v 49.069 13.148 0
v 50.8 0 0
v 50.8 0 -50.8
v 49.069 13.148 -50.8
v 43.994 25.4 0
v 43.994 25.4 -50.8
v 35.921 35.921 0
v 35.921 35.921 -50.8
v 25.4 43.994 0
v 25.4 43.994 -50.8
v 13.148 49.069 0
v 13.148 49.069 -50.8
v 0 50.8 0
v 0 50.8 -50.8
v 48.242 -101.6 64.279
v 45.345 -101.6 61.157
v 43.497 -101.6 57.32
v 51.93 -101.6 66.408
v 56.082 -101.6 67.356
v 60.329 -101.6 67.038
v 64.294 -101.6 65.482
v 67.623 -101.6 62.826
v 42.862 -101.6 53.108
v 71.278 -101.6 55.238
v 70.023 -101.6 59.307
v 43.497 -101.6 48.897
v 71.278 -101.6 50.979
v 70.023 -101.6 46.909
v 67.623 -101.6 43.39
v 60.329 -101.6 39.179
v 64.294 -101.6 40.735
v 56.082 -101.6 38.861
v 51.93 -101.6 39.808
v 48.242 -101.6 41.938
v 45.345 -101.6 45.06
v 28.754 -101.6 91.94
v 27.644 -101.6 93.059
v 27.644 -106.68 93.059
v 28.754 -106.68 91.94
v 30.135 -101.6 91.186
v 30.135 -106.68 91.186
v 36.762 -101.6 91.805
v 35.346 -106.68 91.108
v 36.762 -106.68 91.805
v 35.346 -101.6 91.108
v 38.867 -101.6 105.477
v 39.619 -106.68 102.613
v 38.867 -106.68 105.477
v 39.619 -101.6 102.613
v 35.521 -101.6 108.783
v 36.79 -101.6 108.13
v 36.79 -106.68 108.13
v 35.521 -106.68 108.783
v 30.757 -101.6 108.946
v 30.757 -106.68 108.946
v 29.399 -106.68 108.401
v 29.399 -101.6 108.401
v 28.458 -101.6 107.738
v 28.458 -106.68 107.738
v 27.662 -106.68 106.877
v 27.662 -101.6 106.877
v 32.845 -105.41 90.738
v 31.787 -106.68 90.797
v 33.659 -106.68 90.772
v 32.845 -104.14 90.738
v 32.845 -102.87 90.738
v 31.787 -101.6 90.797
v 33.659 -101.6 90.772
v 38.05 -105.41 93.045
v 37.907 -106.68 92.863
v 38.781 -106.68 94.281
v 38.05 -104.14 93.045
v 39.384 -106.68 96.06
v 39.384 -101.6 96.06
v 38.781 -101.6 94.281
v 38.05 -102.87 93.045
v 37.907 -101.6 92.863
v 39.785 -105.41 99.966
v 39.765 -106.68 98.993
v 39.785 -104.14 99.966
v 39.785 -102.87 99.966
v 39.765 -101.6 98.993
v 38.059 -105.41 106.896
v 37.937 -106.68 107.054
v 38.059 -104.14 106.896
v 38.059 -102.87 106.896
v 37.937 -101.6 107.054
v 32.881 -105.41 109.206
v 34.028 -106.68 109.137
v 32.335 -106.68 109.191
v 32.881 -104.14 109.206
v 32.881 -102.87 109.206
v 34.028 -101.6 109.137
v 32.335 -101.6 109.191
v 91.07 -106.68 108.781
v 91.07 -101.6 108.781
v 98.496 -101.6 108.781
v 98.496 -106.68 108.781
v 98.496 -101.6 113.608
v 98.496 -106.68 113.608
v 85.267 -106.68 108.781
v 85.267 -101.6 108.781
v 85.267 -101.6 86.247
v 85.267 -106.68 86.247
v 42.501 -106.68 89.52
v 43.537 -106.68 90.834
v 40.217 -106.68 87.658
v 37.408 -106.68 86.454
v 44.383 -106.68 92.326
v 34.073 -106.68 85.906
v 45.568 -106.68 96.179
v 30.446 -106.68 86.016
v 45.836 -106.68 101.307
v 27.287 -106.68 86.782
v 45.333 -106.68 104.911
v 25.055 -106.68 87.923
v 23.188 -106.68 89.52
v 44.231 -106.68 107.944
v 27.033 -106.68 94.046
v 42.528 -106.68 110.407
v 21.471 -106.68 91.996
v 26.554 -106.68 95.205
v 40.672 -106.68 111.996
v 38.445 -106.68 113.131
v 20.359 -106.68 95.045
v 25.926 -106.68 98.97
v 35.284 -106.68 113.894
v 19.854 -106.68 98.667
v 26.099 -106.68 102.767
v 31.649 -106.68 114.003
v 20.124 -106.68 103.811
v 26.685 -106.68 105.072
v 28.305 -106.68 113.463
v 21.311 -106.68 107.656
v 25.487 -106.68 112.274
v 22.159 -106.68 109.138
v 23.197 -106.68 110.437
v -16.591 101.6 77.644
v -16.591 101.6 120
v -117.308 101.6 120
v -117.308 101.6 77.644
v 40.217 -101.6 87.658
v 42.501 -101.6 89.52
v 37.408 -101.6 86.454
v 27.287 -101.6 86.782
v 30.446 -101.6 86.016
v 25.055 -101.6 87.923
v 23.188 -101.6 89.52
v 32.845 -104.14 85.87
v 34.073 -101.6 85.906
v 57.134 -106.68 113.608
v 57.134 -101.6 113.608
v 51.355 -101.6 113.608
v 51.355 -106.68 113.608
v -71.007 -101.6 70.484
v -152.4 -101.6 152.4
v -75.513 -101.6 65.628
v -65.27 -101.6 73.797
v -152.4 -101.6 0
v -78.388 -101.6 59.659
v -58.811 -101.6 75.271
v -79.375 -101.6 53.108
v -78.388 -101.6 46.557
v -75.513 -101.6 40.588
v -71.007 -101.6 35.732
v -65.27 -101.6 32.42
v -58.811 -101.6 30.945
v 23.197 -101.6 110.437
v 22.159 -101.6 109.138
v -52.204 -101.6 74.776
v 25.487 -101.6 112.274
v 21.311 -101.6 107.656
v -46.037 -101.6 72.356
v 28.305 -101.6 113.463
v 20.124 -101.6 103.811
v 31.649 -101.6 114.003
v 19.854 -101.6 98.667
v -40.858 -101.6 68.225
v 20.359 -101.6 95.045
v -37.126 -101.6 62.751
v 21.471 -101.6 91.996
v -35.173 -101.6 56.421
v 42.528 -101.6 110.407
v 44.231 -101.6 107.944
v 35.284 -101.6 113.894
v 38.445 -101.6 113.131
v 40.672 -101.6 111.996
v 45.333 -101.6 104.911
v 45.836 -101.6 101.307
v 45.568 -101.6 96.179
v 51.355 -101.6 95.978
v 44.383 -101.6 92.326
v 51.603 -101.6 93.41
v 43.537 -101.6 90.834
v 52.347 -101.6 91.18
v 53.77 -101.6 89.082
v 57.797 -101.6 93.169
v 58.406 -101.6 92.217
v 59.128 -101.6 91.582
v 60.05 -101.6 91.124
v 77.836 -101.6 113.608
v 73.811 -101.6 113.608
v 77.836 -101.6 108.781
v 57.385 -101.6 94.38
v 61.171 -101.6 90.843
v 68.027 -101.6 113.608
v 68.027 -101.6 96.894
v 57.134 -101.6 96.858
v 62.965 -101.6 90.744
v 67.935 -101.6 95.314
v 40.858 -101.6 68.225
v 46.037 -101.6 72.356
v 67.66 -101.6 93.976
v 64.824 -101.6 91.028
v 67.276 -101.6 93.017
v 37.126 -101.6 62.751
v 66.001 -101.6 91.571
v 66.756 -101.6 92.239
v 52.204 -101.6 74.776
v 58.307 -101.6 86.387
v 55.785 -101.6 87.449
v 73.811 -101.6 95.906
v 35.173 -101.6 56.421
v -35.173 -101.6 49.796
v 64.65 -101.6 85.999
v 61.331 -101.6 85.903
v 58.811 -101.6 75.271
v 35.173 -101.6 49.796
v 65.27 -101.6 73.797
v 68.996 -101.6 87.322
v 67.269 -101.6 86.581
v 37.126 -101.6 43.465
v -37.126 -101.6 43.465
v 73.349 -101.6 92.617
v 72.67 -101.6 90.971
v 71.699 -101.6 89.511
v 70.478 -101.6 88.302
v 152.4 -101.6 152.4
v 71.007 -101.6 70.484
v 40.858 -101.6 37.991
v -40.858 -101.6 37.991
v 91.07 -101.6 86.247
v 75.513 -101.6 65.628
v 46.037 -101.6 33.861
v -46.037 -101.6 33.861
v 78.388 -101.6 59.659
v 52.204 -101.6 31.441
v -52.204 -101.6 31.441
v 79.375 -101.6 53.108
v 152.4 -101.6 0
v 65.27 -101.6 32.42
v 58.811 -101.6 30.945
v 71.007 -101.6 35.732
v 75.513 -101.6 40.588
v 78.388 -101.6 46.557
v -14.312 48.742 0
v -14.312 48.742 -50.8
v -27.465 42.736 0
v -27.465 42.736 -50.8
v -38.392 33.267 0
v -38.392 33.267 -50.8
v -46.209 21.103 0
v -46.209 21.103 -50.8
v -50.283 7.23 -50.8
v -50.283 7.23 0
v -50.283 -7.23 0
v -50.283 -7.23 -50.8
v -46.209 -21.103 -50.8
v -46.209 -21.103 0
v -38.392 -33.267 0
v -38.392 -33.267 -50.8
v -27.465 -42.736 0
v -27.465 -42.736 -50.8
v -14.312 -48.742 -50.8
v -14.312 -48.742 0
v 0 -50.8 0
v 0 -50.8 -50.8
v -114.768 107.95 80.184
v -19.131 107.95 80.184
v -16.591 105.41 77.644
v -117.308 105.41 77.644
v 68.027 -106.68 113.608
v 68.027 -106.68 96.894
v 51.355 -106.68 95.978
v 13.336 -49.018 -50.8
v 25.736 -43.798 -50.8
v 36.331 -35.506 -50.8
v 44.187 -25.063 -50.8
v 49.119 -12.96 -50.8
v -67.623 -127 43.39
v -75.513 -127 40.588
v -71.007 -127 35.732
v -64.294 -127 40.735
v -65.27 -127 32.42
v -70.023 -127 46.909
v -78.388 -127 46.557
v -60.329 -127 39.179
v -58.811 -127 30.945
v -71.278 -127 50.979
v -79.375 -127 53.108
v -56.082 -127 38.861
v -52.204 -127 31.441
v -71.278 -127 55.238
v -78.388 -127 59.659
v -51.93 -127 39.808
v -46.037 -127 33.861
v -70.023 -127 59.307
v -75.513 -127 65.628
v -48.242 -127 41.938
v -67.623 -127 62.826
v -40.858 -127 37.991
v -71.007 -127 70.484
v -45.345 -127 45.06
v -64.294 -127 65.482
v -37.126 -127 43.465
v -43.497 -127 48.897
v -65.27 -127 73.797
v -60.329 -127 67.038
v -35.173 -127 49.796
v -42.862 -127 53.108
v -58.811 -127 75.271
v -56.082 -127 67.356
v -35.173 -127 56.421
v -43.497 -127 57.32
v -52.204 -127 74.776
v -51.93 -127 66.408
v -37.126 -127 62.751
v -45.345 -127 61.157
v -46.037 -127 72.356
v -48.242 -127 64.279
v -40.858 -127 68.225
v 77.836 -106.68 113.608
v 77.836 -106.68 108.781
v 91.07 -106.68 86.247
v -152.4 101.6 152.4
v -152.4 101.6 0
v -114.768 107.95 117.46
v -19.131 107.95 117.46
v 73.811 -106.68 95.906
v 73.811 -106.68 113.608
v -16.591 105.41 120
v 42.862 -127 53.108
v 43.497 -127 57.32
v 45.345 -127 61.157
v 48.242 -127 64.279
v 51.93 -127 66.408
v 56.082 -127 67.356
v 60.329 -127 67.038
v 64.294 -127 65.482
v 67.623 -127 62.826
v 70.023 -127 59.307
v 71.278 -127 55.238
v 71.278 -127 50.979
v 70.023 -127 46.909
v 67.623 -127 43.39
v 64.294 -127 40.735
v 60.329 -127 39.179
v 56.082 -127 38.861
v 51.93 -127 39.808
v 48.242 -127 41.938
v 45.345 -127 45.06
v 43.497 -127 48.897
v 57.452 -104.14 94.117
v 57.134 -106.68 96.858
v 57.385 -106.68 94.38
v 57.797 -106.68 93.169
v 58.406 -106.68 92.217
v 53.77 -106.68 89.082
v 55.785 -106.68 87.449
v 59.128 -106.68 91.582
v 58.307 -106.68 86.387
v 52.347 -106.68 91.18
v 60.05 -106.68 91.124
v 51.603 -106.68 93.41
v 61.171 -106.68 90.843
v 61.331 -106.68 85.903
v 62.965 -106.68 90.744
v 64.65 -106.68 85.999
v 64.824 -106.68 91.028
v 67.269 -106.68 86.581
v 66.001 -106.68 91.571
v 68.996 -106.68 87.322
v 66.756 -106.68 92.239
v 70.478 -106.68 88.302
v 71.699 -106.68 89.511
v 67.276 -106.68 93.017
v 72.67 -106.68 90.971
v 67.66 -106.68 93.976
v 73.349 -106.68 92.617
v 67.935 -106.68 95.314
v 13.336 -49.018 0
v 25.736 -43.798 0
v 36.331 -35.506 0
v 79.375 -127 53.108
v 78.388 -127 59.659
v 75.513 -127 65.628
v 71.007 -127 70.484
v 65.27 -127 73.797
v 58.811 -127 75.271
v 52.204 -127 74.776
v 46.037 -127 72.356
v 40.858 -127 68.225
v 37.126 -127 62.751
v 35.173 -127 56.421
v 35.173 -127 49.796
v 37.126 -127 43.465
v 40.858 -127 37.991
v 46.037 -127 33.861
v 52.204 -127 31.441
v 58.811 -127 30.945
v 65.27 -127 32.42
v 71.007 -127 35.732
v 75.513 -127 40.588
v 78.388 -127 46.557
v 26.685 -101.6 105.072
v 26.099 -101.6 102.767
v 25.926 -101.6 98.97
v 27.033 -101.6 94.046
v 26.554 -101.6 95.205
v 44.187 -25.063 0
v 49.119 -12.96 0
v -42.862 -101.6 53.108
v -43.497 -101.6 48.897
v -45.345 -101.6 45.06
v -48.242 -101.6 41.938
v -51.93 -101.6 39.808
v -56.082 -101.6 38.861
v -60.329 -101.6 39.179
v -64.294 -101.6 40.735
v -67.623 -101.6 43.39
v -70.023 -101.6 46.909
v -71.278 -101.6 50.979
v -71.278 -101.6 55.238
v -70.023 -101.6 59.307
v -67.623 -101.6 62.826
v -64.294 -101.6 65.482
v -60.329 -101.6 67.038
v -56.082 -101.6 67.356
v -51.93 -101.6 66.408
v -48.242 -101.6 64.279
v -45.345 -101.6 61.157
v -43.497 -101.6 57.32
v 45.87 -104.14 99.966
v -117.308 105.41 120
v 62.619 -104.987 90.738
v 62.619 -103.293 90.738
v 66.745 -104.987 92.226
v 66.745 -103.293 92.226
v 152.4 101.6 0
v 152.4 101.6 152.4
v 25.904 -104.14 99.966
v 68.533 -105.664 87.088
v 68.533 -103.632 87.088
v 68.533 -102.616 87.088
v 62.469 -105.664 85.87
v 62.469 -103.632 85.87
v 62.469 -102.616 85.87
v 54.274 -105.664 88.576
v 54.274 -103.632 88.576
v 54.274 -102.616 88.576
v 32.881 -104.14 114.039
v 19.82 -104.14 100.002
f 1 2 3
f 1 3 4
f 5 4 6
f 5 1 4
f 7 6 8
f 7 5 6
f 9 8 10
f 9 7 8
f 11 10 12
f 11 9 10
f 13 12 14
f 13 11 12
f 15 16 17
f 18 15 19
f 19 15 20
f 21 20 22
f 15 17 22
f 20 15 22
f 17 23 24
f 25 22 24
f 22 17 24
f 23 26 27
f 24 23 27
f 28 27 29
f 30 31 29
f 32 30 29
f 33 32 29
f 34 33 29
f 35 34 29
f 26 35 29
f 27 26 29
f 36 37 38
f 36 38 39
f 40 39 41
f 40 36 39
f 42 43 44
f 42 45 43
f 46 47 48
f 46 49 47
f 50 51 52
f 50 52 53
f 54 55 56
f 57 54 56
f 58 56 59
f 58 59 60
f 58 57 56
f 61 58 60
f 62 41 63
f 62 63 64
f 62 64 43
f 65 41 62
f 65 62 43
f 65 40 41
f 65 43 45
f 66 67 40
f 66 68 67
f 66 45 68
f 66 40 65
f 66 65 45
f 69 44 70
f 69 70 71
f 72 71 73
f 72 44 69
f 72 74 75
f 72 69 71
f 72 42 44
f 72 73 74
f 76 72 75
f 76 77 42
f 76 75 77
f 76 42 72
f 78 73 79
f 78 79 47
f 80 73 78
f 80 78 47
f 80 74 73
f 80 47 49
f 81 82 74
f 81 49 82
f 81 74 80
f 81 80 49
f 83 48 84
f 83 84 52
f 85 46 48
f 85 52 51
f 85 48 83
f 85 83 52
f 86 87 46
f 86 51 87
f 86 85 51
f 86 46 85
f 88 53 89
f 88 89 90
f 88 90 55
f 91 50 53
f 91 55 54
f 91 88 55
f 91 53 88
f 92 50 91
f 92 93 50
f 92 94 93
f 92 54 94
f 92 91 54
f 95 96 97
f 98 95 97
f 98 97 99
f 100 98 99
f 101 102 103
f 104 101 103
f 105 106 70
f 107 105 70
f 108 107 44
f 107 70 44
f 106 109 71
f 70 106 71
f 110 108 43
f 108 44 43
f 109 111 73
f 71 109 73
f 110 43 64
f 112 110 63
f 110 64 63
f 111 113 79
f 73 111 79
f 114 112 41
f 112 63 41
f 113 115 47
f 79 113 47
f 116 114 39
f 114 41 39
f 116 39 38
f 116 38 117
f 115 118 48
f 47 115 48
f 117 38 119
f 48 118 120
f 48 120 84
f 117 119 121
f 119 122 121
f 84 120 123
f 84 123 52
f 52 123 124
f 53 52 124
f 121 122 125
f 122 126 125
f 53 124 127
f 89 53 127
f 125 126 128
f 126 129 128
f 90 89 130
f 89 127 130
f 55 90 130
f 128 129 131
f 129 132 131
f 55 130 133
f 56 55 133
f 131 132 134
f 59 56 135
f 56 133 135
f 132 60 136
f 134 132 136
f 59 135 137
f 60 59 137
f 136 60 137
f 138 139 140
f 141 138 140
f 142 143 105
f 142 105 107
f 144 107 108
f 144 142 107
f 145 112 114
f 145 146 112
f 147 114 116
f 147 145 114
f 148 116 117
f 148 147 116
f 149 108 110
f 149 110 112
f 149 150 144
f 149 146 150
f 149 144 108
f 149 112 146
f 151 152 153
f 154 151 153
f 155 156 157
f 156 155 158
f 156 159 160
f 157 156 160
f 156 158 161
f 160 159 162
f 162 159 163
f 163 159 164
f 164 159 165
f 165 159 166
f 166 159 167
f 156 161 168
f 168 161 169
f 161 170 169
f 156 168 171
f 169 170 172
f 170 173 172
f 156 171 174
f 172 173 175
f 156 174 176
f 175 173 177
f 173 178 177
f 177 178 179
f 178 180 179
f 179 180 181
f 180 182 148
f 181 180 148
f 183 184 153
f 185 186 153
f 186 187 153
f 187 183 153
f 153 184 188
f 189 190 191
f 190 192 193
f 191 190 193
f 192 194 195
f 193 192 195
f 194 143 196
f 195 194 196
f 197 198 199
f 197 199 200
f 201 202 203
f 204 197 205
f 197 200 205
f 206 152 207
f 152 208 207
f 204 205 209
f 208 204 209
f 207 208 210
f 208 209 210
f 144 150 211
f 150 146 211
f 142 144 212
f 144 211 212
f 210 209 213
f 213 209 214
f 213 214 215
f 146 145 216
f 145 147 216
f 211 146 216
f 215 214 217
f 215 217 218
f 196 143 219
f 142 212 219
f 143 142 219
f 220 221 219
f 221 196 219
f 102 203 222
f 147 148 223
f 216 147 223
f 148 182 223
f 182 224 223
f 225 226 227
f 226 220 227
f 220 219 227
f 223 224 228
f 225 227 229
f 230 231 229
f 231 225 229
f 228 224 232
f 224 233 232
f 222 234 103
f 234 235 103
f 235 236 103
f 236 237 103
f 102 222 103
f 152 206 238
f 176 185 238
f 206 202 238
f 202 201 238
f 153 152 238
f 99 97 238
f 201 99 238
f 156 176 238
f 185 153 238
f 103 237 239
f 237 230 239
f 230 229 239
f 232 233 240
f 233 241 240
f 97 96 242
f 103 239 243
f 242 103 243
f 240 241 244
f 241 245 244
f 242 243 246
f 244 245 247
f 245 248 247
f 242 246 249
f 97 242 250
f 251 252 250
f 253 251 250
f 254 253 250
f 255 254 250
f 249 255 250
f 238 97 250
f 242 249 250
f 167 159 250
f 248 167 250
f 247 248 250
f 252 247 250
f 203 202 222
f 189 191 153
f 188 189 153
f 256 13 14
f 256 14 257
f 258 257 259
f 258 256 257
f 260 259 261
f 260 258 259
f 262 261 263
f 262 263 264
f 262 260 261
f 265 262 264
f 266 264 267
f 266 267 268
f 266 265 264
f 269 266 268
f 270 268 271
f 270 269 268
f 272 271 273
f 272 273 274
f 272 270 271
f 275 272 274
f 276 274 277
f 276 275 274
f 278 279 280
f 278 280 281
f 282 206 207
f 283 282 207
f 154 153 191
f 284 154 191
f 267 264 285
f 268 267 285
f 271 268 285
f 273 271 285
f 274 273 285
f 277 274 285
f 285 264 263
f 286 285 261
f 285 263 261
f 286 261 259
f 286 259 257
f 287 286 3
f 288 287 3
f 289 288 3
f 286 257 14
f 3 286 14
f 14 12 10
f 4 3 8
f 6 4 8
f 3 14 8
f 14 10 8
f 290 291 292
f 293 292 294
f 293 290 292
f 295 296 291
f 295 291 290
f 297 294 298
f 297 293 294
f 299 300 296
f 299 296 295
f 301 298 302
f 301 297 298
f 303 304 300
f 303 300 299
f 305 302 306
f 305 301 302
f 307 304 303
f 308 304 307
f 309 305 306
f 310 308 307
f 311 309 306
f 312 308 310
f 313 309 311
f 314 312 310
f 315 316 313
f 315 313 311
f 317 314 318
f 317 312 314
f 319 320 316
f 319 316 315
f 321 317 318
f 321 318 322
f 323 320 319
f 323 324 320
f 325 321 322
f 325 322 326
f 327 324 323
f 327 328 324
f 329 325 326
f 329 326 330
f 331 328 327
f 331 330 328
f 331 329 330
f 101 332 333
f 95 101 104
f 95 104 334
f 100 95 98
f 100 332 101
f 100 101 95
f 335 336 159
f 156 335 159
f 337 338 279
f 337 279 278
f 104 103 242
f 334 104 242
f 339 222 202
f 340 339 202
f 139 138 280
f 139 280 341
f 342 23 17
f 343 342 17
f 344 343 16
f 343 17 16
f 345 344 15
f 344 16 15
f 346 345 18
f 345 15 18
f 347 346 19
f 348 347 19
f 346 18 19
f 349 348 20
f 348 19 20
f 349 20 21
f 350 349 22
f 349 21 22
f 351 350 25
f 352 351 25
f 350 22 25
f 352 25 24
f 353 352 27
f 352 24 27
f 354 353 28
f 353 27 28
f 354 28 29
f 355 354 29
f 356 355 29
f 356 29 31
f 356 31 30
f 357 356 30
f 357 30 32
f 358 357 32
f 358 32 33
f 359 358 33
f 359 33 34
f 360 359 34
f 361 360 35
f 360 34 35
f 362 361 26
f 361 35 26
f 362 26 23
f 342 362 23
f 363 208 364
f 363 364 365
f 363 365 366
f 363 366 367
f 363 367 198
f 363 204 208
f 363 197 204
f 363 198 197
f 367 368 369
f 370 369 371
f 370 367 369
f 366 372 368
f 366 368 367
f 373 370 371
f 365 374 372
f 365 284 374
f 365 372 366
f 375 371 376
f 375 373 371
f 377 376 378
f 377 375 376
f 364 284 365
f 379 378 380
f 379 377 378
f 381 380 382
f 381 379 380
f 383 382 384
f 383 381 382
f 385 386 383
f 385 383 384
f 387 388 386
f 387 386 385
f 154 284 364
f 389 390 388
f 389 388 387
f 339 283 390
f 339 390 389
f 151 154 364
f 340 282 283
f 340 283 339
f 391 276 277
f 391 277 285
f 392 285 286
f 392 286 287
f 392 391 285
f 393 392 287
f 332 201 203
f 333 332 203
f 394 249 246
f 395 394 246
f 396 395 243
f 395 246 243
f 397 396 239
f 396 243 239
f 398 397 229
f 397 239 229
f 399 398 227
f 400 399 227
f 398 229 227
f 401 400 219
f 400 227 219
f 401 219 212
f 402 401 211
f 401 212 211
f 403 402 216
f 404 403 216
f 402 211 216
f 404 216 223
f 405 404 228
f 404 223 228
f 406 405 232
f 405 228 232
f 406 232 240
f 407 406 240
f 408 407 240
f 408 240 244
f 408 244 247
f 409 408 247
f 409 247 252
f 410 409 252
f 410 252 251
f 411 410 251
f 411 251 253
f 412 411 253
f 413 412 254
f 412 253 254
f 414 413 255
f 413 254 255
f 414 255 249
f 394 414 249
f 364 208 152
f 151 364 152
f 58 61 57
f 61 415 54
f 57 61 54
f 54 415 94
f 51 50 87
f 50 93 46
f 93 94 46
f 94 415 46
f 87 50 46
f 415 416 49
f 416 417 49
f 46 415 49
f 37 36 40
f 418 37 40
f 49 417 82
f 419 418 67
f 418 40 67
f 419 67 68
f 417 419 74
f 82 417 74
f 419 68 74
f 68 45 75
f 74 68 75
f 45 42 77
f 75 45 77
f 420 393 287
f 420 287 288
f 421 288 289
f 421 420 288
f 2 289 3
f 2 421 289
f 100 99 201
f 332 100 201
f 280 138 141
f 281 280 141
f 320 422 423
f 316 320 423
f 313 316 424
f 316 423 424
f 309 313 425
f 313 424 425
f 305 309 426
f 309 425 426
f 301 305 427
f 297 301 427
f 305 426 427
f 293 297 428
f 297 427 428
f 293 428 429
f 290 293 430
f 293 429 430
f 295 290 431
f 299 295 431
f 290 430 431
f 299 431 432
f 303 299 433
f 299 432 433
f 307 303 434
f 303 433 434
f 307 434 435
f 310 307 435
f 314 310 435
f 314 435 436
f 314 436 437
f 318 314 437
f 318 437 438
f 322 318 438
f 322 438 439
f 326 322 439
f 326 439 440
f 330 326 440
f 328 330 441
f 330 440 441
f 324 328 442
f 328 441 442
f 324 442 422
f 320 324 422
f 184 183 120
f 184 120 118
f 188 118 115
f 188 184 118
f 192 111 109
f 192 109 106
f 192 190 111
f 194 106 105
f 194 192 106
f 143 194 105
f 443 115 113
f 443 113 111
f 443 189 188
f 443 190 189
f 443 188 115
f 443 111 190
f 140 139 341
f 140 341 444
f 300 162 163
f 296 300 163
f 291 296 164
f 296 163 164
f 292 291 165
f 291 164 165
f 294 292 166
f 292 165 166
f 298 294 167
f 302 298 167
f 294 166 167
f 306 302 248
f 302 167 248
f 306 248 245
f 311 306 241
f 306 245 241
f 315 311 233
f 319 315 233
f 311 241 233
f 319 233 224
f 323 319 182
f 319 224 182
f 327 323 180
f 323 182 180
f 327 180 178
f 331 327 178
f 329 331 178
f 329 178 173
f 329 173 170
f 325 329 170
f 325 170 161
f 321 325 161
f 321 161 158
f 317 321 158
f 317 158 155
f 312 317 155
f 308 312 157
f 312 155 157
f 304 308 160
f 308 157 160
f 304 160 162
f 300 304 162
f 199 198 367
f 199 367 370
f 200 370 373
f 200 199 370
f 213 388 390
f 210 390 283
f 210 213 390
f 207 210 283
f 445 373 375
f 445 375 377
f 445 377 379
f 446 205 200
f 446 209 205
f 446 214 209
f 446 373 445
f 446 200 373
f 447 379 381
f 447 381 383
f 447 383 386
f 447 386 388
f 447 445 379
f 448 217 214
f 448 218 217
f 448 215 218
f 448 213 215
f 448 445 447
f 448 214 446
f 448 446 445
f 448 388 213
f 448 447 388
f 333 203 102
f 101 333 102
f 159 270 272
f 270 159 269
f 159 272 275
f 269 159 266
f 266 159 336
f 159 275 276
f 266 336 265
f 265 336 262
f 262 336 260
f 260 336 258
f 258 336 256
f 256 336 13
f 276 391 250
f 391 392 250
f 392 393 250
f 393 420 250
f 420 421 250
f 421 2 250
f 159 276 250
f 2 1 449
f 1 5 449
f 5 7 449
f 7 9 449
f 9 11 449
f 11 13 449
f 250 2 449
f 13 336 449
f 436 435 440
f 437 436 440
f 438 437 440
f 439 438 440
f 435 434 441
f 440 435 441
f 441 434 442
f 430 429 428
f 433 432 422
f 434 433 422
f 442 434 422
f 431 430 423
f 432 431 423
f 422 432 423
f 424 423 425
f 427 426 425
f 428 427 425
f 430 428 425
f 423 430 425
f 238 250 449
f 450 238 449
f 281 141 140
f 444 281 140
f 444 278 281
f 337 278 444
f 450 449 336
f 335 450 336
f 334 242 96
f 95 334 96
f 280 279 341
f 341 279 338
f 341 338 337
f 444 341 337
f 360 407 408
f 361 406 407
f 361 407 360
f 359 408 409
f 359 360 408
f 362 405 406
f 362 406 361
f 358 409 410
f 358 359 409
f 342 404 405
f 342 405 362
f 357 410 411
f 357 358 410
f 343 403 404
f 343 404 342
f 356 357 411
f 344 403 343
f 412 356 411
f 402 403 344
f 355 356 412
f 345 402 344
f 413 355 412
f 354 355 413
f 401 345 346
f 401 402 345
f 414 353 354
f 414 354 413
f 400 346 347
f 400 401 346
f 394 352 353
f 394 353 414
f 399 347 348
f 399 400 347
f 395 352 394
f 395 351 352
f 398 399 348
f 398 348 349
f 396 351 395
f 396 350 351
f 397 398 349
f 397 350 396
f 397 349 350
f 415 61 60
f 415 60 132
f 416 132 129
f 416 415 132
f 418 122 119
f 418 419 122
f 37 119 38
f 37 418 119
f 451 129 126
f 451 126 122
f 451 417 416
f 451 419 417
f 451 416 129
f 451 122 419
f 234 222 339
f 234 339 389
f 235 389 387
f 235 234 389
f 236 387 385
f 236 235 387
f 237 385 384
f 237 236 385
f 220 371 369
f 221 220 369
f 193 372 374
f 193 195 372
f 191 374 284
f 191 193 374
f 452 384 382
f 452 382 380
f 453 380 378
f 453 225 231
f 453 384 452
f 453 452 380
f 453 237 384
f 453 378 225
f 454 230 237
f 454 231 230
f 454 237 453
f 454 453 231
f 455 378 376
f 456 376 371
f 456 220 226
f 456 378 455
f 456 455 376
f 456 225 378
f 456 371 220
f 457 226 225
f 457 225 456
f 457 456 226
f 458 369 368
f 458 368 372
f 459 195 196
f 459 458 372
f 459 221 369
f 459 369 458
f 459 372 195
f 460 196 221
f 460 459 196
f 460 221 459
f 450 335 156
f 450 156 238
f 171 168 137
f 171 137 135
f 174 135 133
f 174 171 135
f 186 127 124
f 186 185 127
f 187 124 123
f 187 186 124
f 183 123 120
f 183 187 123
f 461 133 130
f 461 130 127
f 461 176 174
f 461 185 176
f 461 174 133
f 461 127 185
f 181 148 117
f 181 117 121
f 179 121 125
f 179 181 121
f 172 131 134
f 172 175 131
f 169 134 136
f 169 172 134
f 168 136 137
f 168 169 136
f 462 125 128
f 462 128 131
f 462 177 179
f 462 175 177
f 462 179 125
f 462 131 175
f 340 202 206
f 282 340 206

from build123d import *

# Parameters (mm, degrees)
F1_DEPTH  = 152.4
F2_DEPTH  = 50.8
F4_DEPTH  = 25.4
F5_W      = 100.7168591022
F5_H      = 42.3558056355
F6_DEPTH  = 6.35
F7_SIZE   = 2.54
F10_DEPTH = 5.08


with BuildPart() as f1:
    # F0 (on Top) → F1 (new body)
    with BuildSketch(Plane.XY):
        with BuildLine():
            Line((152.4, 0), (50.8, 0))
            ThreePointArc((50.8, 0), (47.0438920676, -19.1706082098), (36.3310149947, -35.5063001375))
            ThreePointArc((36.3310149947, -35.5063001375), (19.7093880297, -46.820722159), (0, -50.8))
            Line((0, -50.8), (0, -101.6))
            Line((0, -101.6), (152.4, -101.6))
            Line((152.4, -101.6), (152.4, 0))
        make_face()
        with BuildLine():
            ThreePointArc((0, 50.8), (35.9210244843, 35.9210244843), (50.8, 0))
            Line((50.8, 0), (152.4, 0))
            Line((152.4, 0), (152.4, 101.6))
            Line((152.4, 101.6), (0, 101.6))
            Line((0, 101.6), (0, 50.8))
        make_face()
        with BuildLine():
            ThreePointArc((0, -50.8), (-50.8, 0), (0, 50.8))
            Line((0, 50.8), (0, 101.6))
            Line((0, 101.6), (-152.4, 101.6))
            Line((-152.4, 101.6), (-152.4, -101.6))
            Line((-152.4, -101.6), (0, -101.6))
            Line((0, -101.6), (0, -50.8))
        make_face()
        with BuildLine():
            Line((0, -50.8), (0, 0))
            Line((0, 0), (0, 50.8))
            ThreePointArc((0, 50.8), (-50.8, 0), (0, -50.8))
        make_face()
        with BuildLine():
            Line((0, 50.8), (0, 0))
            Line((0, 0), (50.8, 0))
            ThreePointArc((50.8, 0), (35.9210244843, 35.9210244843), (0, 50.8))
        make_face()
        with BuildLine():
            Line((36.3310149947, -35.5063001375), (0, 0))
            Line((0, 0), (0, -50.8))
            ThreePointArc((0, -50.8), (19.7093880297, -46.820722159), (36.3310149947, -35.5063001375))
        make_face()
        with BuildLine():
            Line((50.8, 0), (0, 0))
            Line((0, 0), (36.3310149947, -35.5063001375))
            ThreePointArc((36.3310149947, -35.5063001375), (47.0438920676, -19.1706082098), (50.8, 0))
        make_face()
    extrude(amount=F1_DEPTH)

    # F0 (on Top) → F2 (join)
    with BuildSketch(Plane.XY):
        with BuildLine():
            Line((36.3310149947, -35.5063001375), (0, 0))
            Line((0, 0), (0, -50.8))
            ThreePointArc((0, -50.8), (19.7093880297, -46.820722159), (36.3310149947, -35.5063001375))
        make_face()
        with BuildLine():
            Line((50.8, 0), (0, 0))
            Line((0, 0), (36.3310149947, -35.5063001375))
            ThreePointArc((36.3310149947, -35.5063001375), (47.0438920676, -19.1706082098), (50.8, 0))
        make_face()
        with BuildLine():
            Line((0, 50.8), (0, 0))
            Line((0, 0), (50.8, 0))
            ThreePointArc((50.8, 0), (35.9210244843, 35.9210244843), (0, 50.8))
        make_face()
        with BuildLine():
            Line((0, -50.8), (0, 0))
            Line((0, 0), (0, 50.8))
            ThreePointArc((0, 50.8), (-50.8, 0), (0, -50.8))
        make_face()
    extrude(amount=-F2_DEPTH)

    # F3 (on face) → F4 (join)
    with BuildSketch(Plane.XZ.offset(101.6)):
        with BuildLine():
            ThreePointArc((34.925, 53.1082823873), (57.15, 30.8832823873), (79.375, 53.1082823873))
            Line((79.375, 53.1082823873), (71.4375, 53.1082823873))
            ThreePointArc((71.4375, 53.1082823873), (57.15, 38.8207823873), (42.8625, 53.1082823873))
            Line((42.8625, 53.1082823873), (34.925, 53.1082823873))
        make_face()
        with BuildLine():
            Line((71.4375, 53.1082823873), (79.375, 53.1082823873))
            ThreePointArc((79.375, 53.1082823873), (57.15, 75.3332823873), (34.925, 53.1082823873))
            Line((34.925, 53.1082823873), (42.8625, 53.1082823873))
            ThreePointArc((42.8625, 53.1082823873), (57.15, 67.3957823873), (71.4375, 53.1082823873))
        make_face()
        with BuildLine():
            ThreePointArc((-34.925, 53.1082823873), (-57.15, 75.3332823873), (-79.375, 53.1082823873))
            Line((-79.375, 53.1082823873), (-71.4375, 53.1082823873))
            ThreePointArc((-71.4375, 53.1082823873), (-57.15, 67.3957823873), (-42.8625, 53.1082823873))
            Line((-42.8625, 53.1082823873), (-34.925, 53.1082823873))
        make_face()
        with BuildLine():
            Line((-71.4375, 53.1082823873), (-79.375, 53.1082823873))
            ThreePointArc((-79.375, 53.1082823873), (-57.15, 30.8832823873), (-34.925, 53.1082823873))
            Line((-34.925, 53.1082823873), (-42.8625, 53.1082823873))
            ThreePointArc((-42.8625, 53.1082823873), (-57.15, 38.8207823873), (-71.4375, 53.1082823873))
        make_face()
    extrude(amount=F4_DEPTH)

    # F9 (on face) + F8 (on face) → F10 (join)
    with BuildSketch(Plane.XZ.offset(101.6)):
        Polygon((91.0699902064, 86.2468481064), (91.0699902064, 108.7812007722), (98.4956073484, 108.7812007722), (98.4956073484, 113.6078519145), (77.8356241709, 113.6078519145), (77.8356241709, 108.7812007722), (85.2672297139, 108.7812007722), (85.2672297139, 86.2468481064), align=None)
        with BuildLine():
            Line((73.811418752, 113.6078519145), (68.0266234623, 113.6078519145))
            Line((68.0266234623, 113.6078519145), (68.0266234623, 96.894224944))
            add(Edge.make_bspline(
                [(66.7451056652, 92.226266426), (68.0266234623, 93.7143840549), (68.0266234623, 96.894224944)],
                knots=[0, 0, 0, 1, 1, 1], degree=2))
            add(Edge.make_bspline(
                [(62.6190974306, 90.7381487971), (65.4635878681, 90.7381487971), (66.7451056652, 92.226266426)],
                knots=[0, 0, 0, 1, 1, 1], degree=2))
            add(Edge.make_bspline(
                [(58.4062573827, 92.2172838246), (59.6787925784, 90.7381487971), (62.6190974306, 90.7381487971)],
                knots=[0, 0, 0, 1, 1, 1], degree=2))
            add(Edge.make_bspline(
                [(57.1337221869, 96.8582945384), (57.1337221869, 93.6964188521), (58.4062573827, 92.2172838246)],
                knots=[0, 0, 0, 1, 1, 1], degree=2))
            Line((57.1337221869, 96.8582945384), (57.1337221869, 113.6078519145))
            Line((57.1337221869, 113.6078519145), (51.3549152982, 113.6078519145))
            Line((51.3549152982, 113.6078519145), (51.3549152982, 95.977999603))
            add(Edge.make_bspline(
                [(54.2742607472, 88.5763360647), (51.3549152982, 91.283093281), (51.3549152982, 95.977999603)],
                knots=[0, 0, 0, 1, 1, 1], degree=2))
            add(Edge.make_bspline(
                [(62.4693874076, 85.8695788484), (57.1936061962, 85.8695788484), (54.2742607472, 88.5763360647)],
                knots=[0, 0, 0, 1, 1, 1], degree=2))
            add(Edge.make_bspline(
                [(68.5326433401, 87.0882184358), (65.9666135454, 85.8695788484), (62.4693874076, 85.8695788484)],
                knots=[0, 0, 0, 1, 1, 1], degree=2))
            add(Edge.make_bspline(
                [(72.4550459434, 90.5884387741), (71.0986731348, 88.3068580232), (68.5326433401, 87.0882184358)],
                knots=[0, 0, 0, 1, 1, 1], degree=2))
            add(Edge.make_bspline(
                [(73.811418752, 95.906138792), (73.811418752, 92.870019525), (72.4550459434, 90.5884387741)],
                knots=[0, 0, 0, 1, 1, 1], degree=2))
            Line((73.811418752, 95.906138792), (73.811418752, 113.6078519145))
        make_face()
    with BuildSketch(Plane.XZ.offset(101.6)):
        with BuildLine():
            add(Edge.make_bspline(
                [(45.8695400545, 99.9662746164), (45.8695400545, 93.1694395711), (42.5010645364, 89.5195092097)],
                knots=[0, 0, 0, 1, 1, 1], degree=2))
            add(Edge.make_bspline(
                [(42.5280123406, 110.4070516222), (45.8695400545, 106.7750864636), (45.8695400545, 99.9662746164)],
                knots=[0, 0, 0, 1, 1, 1], degree=2))
            add(Edge.make_bspline(
                [(32.8806984568, 114.0390167808), (39.1864846266, 114.0390167808), (42.5280123406, 110.4070516222)],
                knots=[0, 0, 0, 1, 1, 1], degree=2))
            add(Edge.make_bspline(
                [(23.1974541675, 110.4369936268), (26.574912287, 114.0390167808), (32.8806984568, 114.0390167808)],
                knots=[0, 0, 0, 1, 1, 1], degree=2))
            add(Edge.make_bspline(
                [(19.8199960481, 100.002205022), (19.8199960481, 106.8349704728), (23.1974541675, 110.4369936268)],
                knots=[0, 0, 0, 1, 1, 1], degree=2))
            add(Edge.make_bspline(
                [(23.1884715661, 89.5195092097), (19.8199960481, 93.1694395711), (19.8199960481, 100.002205022)],
                knots=[0, 0, 0, 1, 1, 1], degree=2))
            add(Edge.make_bspline(
                [(32.8447680513, 85.8695788484), (26.5569470842, 85.8695788484), (23.1884715661, 89.5195092097)],
                knots=[0, 0, 0, 1, 1, 1], degree=2))
            add(Edge.make_bspline(
                [(42.5010645364, 89.5195092097), (39.1325890184, 85.8695788484), (32.8447680513, 85.8695788484)],
                knots=[0, 0, 0, 1, 1, 1], degree=2))
        make_face()
        with BuildLine():
            add(Edge.make_bspline(
                [(25.9042113838, 99.9662746164), (25.9042113838, 95.3791595109), (27.6438418514, 93.058654154)],
                knots=[0, 0, 0, 1, 1, 1], degree=2))
            add(Edge.make_bspline(
                [(27.6618070541, 106.8768892793), (25.9042113838, 104.547401321), (25.9042113838, 99.9662746164)],
                knots=[0, 0, 0, 1, 1, 1], degree=2))
            add(Edge.make_bspline(
                [(32.8806984568, 109.2063772376), (29.4194027245, 109.2063772376), (27.6618070541, 106.8768892793)],
                knots=[0, 0, 0, 1, 1, 1], degree=2))
            add(Edge.make_bspline(
                [(39.7853247188, 99.9662746164), (39.7853247188, 109.2063772376), (32.8806984568, 109.2063772376)],
                knots=[0, 0, 0, 1, 1, 1], degree=2))
            add(Edge.make_bspline(
                [(32.8447680513, 90.7381487971), (39.7853247188, 90.7381487971), (39.7853247188, 99.9662746164)],
                knots=[0, 0, 0, 1, 1, 1], degree=2))
            add(Edge.make_bspline(
                [(27.6438418514, 93.058654154), (29.3834723189, 90.7381487971), (32.8447680513, 90.7381487971)],
                knots=[0, 0, 0, 1, 1, 1], degree=2))
        make_face(mode=Mode.SUBTRACT)
    extrude(amount=F10_DEPTH)


with BuildPart() as f6:
    # F5 (on face) → F6 (new body)
    with BuildSketch(Plane(origin=(0, 101.6, 0), x_dir=(-1, 0, 0), z_dir=(0, 1, 0))):
        with Locations((66.9497698545, 98.8216623664)):
            Rectangle(F5_W, F5_H)
    extrude(amount=F6_DEPTH)

    # F7
    f7_edges = [f6.edges().sort_by_distance(p)[0] for p in [
        (-66.94977, 107.95, 119.999565),
        (-117.308199, 107.95, 98.821662),
        (-16.59134, 107.95, 98.821662),
        (-66.94977, 107.95, 77.64376),
    ]]
    chamfer(f7_edges, length=F7_SIZE)


solid = Compound([f1.part, f6.part])
